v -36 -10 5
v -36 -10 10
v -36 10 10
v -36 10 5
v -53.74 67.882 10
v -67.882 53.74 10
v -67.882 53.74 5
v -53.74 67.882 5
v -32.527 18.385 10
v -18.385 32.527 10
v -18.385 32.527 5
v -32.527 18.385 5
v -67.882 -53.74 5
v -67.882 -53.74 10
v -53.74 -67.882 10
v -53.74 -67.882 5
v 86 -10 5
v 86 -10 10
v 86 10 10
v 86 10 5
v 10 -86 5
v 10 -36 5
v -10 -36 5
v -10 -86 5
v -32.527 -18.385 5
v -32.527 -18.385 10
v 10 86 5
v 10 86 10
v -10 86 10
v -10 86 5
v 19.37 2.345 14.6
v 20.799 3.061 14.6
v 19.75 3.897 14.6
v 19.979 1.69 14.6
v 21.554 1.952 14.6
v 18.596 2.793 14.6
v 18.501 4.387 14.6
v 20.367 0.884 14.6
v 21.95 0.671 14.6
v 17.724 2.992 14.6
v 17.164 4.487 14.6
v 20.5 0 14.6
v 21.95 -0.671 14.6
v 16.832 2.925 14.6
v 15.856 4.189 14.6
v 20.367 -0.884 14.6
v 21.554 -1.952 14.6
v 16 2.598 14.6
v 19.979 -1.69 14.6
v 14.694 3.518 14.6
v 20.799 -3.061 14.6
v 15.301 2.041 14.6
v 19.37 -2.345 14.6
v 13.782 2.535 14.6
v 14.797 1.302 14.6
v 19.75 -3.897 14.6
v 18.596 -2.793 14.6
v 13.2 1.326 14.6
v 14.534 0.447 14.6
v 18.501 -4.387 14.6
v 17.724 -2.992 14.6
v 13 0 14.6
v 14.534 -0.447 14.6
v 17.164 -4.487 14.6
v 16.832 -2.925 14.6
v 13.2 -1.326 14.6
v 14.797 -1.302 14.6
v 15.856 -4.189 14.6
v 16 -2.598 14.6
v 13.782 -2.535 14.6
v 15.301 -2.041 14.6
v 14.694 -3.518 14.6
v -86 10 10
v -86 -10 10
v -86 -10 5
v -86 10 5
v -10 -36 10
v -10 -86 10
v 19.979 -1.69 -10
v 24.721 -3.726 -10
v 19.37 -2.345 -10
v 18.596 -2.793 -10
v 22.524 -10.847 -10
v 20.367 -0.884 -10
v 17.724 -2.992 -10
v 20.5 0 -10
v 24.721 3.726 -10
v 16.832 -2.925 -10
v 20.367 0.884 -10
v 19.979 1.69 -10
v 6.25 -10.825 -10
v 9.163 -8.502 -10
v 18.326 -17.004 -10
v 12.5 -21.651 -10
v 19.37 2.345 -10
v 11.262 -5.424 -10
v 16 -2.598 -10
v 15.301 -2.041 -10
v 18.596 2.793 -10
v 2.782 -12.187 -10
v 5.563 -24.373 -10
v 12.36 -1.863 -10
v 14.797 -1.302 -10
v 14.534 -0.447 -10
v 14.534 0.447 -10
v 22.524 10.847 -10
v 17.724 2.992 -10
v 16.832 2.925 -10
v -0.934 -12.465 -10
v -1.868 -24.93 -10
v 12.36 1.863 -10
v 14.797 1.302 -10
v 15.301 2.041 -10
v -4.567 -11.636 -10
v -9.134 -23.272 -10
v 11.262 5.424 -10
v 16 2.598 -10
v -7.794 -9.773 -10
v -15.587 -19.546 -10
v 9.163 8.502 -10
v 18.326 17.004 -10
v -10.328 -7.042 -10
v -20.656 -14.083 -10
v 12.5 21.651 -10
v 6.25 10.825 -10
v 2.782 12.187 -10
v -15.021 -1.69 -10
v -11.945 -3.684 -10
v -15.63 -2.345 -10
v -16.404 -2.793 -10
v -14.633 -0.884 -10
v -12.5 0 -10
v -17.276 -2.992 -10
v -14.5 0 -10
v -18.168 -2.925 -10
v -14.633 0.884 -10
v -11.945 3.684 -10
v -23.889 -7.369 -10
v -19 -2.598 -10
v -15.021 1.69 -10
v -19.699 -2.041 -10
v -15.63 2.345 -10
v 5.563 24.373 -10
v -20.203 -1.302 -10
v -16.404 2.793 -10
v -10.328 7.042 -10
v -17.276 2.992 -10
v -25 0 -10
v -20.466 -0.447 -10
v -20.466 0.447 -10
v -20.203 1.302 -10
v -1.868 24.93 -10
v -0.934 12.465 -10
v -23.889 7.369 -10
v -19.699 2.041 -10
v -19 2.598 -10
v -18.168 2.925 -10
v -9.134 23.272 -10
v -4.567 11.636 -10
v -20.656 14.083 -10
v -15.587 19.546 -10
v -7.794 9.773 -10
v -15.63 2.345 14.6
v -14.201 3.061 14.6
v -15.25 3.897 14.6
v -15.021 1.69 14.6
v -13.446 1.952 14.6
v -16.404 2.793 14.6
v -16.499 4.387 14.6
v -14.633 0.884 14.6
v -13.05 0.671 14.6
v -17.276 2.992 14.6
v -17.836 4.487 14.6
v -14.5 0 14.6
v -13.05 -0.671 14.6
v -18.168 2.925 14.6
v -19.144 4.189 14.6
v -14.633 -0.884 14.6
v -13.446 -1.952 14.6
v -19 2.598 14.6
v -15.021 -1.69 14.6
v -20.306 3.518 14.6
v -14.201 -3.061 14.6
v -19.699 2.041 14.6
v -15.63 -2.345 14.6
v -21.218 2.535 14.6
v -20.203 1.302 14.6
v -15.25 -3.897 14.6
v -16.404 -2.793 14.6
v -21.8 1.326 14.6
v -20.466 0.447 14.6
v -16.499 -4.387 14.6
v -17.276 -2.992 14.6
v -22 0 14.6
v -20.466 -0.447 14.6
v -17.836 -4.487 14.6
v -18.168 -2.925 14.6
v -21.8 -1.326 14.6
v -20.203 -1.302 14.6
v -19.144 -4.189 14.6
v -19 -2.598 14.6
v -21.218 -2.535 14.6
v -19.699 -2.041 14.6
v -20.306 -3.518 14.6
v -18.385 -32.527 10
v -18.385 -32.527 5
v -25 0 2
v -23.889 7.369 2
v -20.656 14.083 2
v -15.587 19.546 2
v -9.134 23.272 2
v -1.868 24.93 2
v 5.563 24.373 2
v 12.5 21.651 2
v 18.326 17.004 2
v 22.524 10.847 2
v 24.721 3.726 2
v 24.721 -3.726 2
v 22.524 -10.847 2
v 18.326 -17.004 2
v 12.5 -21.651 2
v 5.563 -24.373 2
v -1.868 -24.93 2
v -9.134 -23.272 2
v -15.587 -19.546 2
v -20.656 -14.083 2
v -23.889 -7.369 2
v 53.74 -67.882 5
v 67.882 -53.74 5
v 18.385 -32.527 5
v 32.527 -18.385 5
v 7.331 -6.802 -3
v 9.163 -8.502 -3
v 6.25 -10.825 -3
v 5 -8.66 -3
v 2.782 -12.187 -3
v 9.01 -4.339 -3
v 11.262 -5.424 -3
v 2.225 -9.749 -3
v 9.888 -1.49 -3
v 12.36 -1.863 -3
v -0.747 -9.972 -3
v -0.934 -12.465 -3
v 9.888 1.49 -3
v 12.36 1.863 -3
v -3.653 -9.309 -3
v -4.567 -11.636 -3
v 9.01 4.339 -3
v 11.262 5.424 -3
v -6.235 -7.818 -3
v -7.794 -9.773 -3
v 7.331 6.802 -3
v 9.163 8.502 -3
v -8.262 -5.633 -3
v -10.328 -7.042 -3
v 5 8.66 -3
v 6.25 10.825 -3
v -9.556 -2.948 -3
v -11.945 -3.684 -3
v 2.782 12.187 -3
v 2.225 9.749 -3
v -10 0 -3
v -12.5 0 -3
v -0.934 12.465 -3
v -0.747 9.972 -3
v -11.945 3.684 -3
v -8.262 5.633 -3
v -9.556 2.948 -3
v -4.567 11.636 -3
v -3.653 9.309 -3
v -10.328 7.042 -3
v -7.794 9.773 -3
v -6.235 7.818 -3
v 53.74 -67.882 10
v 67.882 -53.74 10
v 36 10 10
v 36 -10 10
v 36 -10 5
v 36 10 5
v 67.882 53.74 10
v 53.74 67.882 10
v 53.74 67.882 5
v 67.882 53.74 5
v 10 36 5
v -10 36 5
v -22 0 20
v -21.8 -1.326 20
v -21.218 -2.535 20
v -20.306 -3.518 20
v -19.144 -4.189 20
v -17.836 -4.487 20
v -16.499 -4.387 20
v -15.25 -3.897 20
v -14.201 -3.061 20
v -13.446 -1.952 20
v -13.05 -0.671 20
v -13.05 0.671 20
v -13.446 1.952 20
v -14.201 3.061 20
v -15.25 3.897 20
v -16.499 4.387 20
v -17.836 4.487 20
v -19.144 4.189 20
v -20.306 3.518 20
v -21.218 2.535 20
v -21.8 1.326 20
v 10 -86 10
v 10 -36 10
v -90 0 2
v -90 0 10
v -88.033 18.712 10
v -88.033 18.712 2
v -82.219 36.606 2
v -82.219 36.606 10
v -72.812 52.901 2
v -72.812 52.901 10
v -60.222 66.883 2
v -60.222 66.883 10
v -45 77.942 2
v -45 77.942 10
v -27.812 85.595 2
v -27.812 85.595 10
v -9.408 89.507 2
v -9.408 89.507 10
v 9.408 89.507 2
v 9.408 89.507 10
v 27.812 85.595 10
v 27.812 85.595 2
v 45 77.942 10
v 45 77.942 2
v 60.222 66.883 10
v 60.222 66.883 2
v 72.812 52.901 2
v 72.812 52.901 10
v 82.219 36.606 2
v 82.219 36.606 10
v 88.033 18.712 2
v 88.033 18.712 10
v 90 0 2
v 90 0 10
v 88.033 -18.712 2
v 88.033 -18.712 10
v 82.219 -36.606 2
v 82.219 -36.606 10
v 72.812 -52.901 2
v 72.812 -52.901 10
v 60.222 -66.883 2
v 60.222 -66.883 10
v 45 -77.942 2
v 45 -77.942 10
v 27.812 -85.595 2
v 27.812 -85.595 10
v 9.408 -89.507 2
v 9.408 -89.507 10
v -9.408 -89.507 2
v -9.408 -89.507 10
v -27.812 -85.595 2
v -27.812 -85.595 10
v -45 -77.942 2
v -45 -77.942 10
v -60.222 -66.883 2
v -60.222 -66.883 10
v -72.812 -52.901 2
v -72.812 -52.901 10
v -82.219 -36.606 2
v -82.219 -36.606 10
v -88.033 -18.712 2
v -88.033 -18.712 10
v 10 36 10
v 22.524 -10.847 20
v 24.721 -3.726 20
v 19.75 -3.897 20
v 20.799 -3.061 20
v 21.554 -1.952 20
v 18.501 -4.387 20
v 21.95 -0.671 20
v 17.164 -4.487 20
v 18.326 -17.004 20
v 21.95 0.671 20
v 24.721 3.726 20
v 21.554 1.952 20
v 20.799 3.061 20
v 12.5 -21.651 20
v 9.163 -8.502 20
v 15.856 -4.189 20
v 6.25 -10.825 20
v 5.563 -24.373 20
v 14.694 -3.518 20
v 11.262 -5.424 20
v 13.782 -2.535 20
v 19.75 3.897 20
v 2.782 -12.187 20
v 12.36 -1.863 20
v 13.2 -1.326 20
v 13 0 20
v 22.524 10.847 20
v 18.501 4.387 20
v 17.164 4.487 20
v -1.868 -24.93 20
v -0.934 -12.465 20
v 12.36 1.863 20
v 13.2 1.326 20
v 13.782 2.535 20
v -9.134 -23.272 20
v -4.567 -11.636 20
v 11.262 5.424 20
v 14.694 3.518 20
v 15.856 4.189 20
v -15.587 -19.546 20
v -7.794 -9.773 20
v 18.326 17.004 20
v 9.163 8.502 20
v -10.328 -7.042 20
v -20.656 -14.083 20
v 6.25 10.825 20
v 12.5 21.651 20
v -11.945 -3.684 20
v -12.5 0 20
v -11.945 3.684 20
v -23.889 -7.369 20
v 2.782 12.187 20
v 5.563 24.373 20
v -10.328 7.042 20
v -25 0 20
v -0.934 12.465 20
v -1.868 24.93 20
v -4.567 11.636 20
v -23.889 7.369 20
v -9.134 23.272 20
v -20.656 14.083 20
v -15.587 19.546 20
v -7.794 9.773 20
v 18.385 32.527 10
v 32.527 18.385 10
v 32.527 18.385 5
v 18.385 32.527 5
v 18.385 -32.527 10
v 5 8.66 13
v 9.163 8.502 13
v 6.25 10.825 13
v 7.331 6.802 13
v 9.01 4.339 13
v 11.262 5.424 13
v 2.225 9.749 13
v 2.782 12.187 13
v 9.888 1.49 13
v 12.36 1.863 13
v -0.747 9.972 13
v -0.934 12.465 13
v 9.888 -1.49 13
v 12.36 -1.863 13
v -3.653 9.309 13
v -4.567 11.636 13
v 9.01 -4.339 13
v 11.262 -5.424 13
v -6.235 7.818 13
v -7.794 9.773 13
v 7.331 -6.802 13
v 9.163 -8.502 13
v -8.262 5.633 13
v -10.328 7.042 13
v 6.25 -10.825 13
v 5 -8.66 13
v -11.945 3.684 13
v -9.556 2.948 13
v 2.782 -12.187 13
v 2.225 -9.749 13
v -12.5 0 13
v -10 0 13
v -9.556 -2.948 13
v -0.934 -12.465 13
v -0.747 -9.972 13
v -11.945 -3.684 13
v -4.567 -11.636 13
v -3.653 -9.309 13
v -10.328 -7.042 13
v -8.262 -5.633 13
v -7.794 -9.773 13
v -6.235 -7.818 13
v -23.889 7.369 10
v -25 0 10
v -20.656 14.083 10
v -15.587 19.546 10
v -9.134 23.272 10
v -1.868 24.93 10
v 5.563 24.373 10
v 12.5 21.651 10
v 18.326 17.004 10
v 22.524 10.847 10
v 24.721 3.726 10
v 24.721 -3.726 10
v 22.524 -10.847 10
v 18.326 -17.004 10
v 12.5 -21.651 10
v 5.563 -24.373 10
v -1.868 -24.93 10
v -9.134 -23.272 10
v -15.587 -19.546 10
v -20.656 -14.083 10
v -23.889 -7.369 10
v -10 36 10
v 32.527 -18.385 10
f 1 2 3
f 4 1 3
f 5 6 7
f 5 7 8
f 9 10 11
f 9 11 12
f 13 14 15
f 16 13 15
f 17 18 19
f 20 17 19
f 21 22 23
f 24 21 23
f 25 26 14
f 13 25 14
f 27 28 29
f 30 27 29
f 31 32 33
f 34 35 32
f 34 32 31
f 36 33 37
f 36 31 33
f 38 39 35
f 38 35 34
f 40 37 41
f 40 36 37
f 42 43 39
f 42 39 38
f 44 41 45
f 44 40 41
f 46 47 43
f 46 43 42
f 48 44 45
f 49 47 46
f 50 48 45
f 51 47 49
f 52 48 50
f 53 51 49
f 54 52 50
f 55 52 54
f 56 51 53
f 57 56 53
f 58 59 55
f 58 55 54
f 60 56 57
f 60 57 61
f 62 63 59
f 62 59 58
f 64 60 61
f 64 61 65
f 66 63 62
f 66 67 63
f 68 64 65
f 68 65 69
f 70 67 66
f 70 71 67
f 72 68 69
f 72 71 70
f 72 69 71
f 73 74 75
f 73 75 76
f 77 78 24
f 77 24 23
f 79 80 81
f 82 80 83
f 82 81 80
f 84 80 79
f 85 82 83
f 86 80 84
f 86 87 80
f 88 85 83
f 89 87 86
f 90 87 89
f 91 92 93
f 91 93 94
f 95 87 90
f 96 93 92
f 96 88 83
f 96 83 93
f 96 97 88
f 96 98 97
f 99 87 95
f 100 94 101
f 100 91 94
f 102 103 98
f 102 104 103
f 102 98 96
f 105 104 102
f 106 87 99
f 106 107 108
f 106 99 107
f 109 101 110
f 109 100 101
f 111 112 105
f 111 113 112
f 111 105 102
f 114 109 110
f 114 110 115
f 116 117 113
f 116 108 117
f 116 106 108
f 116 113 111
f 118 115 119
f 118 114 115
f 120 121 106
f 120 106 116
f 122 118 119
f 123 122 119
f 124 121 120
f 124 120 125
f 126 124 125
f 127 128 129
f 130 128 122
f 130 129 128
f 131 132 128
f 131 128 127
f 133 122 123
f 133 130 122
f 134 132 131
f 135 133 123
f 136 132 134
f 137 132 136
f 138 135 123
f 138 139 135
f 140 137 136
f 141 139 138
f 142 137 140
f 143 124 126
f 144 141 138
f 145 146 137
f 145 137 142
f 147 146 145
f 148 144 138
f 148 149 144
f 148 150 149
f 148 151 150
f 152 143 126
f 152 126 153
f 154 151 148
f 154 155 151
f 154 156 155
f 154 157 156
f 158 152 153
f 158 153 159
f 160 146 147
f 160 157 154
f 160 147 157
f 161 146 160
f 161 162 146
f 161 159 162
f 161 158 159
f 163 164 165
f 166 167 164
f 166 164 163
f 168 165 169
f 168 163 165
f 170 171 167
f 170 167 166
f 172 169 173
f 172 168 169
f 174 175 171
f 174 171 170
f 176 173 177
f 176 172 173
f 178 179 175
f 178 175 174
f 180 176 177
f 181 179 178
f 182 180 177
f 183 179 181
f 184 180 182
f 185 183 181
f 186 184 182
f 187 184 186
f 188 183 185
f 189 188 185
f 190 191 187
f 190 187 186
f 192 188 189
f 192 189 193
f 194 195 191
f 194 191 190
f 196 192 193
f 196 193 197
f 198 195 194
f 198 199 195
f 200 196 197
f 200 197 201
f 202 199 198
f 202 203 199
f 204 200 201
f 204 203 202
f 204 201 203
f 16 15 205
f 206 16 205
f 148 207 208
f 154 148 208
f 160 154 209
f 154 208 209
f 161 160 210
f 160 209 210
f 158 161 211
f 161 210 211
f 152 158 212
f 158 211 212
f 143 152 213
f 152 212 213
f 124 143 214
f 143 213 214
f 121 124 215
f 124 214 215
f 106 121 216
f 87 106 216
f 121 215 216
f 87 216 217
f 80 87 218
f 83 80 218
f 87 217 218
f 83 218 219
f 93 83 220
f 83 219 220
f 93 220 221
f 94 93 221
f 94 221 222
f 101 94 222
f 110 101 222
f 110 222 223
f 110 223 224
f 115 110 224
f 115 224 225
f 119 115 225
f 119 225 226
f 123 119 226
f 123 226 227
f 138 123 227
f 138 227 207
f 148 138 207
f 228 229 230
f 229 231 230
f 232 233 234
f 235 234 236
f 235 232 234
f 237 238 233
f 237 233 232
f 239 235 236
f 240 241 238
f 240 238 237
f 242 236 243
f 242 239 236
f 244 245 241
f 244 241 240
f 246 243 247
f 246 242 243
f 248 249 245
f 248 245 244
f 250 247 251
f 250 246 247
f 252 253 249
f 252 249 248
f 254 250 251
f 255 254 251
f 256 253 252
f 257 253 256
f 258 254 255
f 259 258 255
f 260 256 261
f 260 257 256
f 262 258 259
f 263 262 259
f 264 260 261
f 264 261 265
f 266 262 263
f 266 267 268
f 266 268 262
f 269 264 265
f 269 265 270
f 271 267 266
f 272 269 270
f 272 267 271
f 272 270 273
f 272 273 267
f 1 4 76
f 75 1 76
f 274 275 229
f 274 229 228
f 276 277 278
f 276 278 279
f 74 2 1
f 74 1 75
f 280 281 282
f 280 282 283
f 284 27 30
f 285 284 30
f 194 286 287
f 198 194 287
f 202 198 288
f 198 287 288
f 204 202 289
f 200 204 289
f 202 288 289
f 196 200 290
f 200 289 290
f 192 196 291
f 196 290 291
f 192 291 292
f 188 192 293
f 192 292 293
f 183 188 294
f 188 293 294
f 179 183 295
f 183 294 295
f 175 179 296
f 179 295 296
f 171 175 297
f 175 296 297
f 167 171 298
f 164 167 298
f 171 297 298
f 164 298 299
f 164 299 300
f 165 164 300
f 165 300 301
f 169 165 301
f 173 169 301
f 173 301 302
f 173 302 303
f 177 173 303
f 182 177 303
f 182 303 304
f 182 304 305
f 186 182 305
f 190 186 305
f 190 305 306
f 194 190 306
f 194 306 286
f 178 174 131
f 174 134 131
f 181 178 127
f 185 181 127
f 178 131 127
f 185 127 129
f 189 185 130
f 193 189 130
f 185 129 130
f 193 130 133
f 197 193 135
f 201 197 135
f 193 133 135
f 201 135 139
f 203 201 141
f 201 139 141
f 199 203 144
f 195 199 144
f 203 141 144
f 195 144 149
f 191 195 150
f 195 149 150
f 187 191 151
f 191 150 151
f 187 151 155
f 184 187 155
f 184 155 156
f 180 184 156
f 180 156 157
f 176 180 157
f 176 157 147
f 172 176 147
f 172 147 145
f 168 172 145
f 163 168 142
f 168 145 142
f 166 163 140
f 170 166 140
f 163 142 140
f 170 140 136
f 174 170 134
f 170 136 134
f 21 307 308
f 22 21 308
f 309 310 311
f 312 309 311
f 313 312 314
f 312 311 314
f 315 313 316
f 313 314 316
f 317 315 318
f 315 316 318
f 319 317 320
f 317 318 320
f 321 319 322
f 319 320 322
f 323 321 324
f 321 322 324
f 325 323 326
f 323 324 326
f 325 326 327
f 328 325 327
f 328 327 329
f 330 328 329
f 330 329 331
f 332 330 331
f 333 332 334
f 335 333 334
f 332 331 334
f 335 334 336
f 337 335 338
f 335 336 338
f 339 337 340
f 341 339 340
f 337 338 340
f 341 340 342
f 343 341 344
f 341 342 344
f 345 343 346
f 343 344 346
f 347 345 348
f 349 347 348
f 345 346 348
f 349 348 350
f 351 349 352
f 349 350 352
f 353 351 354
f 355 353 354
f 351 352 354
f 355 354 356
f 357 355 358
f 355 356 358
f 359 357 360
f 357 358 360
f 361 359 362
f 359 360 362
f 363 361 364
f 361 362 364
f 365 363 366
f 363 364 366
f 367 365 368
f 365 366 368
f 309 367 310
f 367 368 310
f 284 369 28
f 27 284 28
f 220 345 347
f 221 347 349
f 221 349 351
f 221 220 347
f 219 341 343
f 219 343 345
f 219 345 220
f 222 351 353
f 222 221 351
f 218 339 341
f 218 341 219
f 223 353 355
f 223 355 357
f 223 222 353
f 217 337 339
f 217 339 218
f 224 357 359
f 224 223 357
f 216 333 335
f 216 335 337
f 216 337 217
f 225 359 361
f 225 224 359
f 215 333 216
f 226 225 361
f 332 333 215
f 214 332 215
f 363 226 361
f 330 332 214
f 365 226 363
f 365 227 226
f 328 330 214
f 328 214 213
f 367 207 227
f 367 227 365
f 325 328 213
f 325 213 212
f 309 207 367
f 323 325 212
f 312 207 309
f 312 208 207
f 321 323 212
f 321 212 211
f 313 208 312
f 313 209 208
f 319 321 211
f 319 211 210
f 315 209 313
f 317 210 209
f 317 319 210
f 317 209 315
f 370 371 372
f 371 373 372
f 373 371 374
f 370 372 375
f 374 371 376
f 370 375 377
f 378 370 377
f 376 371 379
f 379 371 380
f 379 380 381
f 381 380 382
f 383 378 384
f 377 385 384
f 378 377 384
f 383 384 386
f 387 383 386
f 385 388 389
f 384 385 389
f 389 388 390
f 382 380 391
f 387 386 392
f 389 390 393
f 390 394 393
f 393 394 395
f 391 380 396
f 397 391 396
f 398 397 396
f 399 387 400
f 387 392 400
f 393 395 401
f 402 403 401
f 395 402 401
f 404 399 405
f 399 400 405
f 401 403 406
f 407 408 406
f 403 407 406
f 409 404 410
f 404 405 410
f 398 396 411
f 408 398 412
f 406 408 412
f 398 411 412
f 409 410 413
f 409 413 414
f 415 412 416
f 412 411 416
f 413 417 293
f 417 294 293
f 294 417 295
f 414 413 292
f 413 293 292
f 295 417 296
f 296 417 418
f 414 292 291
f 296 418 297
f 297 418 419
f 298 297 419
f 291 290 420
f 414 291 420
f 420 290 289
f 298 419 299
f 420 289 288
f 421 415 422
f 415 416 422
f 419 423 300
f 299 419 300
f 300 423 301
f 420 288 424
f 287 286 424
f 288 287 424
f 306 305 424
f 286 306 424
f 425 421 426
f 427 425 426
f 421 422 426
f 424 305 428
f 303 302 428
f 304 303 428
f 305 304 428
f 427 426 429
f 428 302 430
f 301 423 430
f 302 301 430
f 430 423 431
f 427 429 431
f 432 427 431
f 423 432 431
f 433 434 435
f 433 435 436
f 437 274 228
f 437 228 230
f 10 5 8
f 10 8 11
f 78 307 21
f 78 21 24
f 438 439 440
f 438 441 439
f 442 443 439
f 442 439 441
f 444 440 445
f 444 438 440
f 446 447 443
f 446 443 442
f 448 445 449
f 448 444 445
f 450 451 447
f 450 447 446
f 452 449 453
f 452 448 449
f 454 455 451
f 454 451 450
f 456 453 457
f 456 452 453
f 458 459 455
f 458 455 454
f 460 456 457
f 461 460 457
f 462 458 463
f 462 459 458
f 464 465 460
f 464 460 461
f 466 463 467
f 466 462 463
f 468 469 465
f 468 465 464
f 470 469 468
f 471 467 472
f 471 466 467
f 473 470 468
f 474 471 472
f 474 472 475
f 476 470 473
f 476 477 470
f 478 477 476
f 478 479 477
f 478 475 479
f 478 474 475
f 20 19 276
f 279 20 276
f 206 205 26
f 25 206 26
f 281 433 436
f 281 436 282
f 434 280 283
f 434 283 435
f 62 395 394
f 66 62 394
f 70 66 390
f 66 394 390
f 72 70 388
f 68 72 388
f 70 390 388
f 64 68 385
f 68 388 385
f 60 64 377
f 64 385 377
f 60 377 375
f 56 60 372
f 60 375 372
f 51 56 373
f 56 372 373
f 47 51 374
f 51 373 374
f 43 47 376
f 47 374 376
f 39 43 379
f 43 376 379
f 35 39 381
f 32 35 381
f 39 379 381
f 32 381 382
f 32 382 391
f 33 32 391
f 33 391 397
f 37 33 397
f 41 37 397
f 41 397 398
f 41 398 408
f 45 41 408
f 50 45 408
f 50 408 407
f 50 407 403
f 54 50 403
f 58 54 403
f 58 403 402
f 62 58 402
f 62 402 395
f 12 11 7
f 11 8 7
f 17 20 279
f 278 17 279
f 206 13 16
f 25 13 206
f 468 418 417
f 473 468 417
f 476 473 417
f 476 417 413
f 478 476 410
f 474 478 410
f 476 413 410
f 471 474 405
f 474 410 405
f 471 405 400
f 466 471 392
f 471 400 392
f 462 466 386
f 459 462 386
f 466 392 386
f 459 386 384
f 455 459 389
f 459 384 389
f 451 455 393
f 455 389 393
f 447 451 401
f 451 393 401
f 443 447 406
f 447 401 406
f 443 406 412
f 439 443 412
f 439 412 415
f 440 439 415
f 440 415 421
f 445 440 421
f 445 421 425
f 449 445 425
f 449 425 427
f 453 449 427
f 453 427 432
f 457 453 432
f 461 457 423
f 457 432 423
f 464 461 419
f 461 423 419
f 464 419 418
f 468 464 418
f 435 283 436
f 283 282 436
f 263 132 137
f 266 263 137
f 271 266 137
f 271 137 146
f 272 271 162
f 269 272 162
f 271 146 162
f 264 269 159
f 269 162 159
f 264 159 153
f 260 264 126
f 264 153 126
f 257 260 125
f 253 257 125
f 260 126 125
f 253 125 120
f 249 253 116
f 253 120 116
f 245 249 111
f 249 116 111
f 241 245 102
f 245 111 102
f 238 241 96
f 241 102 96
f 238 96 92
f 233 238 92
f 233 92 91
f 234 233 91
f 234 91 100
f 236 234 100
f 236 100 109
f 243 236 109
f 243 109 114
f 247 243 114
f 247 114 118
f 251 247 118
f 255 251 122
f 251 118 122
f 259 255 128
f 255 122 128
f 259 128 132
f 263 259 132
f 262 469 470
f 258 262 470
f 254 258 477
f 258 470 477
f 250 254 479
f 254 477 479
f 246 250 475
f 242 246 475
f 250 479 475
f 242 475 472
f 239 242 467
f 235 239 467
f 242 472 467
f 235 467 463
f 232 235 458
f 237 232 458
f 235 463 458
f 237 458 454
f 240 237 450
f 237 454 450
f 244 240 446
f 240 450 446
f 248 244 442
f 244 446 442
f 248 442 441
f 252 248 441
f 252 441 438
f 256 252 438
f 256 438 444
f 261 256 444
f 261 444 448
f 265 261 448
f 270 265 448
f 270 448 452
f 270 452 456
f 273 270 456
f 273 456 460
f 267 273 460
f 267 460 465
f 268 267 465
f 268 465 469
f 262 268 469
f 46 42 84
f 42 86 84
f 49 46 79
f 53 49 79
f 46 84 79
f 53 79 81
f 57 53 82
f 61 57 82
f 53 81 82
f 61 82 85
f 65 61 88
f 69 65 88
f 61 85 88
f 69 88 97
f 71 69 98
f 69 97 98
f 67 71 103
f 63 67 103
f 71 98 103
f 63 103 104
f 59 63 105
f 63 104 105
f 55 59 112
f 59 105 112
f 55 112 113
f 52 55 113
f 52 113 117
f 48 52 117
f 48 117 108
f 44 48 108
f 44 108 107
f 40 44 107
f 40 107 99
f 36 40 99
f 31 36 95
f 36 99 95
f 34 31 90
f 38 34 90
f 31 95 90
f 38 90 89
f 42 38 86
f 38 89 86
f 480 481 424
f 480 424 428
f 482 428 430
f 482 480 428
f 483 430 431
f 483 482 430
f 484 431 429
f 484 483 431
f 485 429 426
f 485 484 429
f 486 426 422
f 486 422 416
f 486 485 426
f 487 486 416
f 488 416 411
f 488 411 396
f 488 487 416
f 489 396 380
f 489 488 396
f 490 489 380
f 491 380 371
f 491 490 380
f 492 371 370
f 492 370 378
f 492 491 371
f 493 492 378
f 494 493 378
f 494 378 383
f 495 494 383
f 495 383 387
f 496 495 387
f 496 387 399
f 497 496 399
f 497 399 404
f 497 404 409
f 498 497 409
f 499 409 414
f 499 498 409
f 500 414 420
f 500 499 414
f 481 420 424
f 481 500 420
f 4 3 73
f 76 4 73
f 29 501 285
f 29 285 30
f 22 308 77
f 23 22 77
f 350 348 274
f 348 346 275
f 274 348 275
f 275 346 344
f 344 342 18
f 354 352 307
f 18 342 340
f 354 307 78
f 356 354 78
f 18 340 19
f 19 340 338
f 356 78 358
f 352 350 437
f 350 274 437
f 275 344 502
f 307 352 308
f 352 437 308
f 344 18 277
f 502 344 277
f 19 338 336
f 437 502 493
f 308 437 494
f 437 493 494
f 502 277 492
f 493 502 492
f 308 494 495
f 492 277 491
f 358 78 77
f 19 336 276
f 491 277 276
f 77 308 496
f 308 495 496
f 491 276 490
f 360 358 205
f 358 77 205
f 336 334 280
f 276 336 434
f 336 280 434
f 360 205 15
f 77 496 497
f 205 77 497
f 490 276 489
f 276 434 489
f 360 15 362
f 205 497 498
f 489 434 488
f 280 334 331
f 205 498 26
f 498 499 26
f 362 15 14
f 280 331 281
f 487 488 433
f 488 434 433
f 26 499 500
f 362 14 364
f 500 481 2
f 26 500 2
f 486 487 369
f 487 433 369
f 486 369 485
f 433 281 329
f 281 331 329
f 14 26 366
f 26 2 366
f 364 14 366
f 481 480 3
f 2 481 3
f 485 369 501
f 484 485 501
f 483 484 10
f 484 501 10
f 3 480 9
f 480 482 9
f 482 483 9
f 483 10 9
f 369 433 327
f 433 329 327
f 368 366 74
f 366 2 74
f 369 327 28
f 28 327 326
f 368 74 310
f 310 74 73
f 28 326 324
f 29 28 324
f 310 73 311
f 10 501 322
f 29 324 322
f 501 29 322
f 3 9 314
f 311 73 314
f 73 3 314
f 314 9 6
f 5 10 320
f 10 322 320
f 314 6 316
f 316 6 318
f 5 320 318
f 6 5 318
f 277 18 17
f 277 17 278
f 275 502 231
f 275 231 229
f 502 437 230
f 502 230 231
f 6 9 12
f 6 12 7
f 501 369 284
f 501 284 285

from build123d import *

# Parameters (mm, degrees)
SKETCH_R             = 90
PAD_DEPTH            = 8
SKETCH001_W          = 20
SKETCH001_H          = 50
POCKET_DEPTH         = 5
SKETCH002_W          = 20
SKETCH002_H          = 50
POCKET001_DEPTH      = 5
SKETCH003_W          = 50
SKETCH003_H          = 20
POCKET002_DEPTH      = 5
SKETCH004_W          = 50
SKETCH004_H          = 20
POCKET003_DEPTH      = 5
POCKET004_DEPTH      = 5
POCKET005_DEPTH      = 5
POCKET006_DEPTH      = 5
POCKET007_DEPTH      = 5
SKETCH009_R          = 25
PAD001_DEPTH         = 20
PAD001_DEPTH_BACK    = 10
SKETCH010_R          = 10
HOLE_DEPTH           = 30.001
SKETCH011_R          = 12.5
POCKET008_DEPTH      = 7
SKETCH012_R          = 12.5
POCKET009_DEPTH      = 7
HOLE001_D            = 6
HOLE001_CBORE_D      = 9
HOLE001_CBORE_DEPTH  = 5.4
BODY_PLACEMENT_ANGLE = 180


with BuildPart() as part:
    # Sketch → Pad (new body)
    with BuildSketch(Plane.XY):
        Circle(SKETCH_R)
    extrude(amount=PAD_DEPTH)

    # Sketch001 → Pocket (cut)
    with BuildSketch(Plane.XY):
        with Locations((0, 61)):
            Rectangle(SKETCH001_W, SKETCH001_H)
    extrude(amount=POCKET_DEPTH, mode=Mode.SUBTRACT)

    # Sketch002 → Pocket001 (cut)
    with BuildSketch(Plane.XY):
        with Locations((0, -61)):
            Rectangle(SKETCH002_W, SKETCH002_H)
    extrude(amount=POCKET001_DEPTH, mode=Mode.SUBTRACT)

    # Sketch003 → Pocket002 (cut)
    with BuildSketch(Plane.XY):
        with Locations((61, 0)):
            Rectangle(SKETCH003_W, SKETCH003_H)
    extrude(amount=POCKET002_DEPTH, mode=Mode.SUBTRACT)

    # Sketch004 → Pocket003 (cut)
    with BuildSketch(Plane.XY):
        with Locations((-61, 0)):
            Rectangle(SKETCH004_W, SKETCH004_H)
    extrude(amount=POCKET003_DEPTH, mode=Mode.SUBTRACT)

    # Sketch005 → Pocket004 (cut)
    with BuildSketch(Plane.XY):
        Polygon((-67.882251, 53.740115), (-32.526912, 18.384776), (-18.384776, 32.526912), (-53.740115, 67.882251), align=None)
    extrude(amount=POCKET004_DEPTH, mode=Mode.SUBTRACT)

    # Sketch006 → Pocket005 (cut)
    with BuildSketch(Plane.XY):
        Polygon((18.384776, 32.526912), (32.526912, 18.384776), (67.882251, 53.740115), (53.740115, 67.882251), align=None)
    extrude(amount=POCKET005_DEPTH, mode=Mode.SUBTRACT)

    # Sketch007 → Pocket006 (cut)
    with BuildSketch(Plane.XY):
        Polygon((-67.882251, -53.740115), (-53.740115, -67.882251), (-18.384776, -32.526912), (-32.526912, -18.384776), align=None)
    extrude(amount=POCKET006_DEPTH, mode=Mode.SUBTRACT)

    # Sketch008 → Pocket007 (cut)
    with BuildSketch(Plane.XY):
        Polygon((18.384776, -32.526912), (32.526912, -18.384776), (67.882251, -53.740115), (53.740115, -67.882251), align=None)
    extrude(amount=POCKET007_DEPTH, mode=Mode.SUBTRACT)

    # Sketch009 → Pad001 (join, two sides)
    with BuildSketch(Plane.XY) as pad001_sk:
        Circle(SKETCH009_R)
    extrude(amount=PAD001_DEPTH)
    extrude(pad001_sk.sketch, amount=-PAD001_DEPTH_BACK)

    # Sketch010 (on Face42 of Pad001) → Hole (cut, through all)
    with BuildSketch(Plane(origin=(0, 0, -10), x_dir=(1, 0, 0), z_dir=(0, 0, -1))):
        Circle(SKETCH010_R)
    extrude(amount=-HOLE_DEPTH, mode=Mode.SUBTRACT)

    # Sketch011 (on Face42 of Hole) → Pocket008 (cut)
    with BuildSketch(Plane(origin=(0, 0, -10), x_dir=(1, 0, 0), z_dir=(0, 0, -1))):
        Circle(SKETCH011_R)
    extrude(amount=-POCKET008_DEPTH, mode=Mode.SUBTRACT)

    # Sketch012 (on Face47 of Pocket008) → Pocket009 (cut)
    with BuildSketch(Plane.XY.offset(20)):
        Circle(SKETCH012_R)
    extrude(amount=-POCKET009_DEPTH, mode=Mode.SUBTRACT)

    # Hole001 (through all)
    with Locations(Plane(origin=(0, 0, -10), x_dir=(1, 0, 0), z_dir=(0, 0, -1))):
        with Locations((0, 0), (17.5, 0), (-17.5, 0)):
            CounterBoreHole(HOLE001_D / 2, HOLE001_CBORE_D / 2, HOLE001_CBORE_DEPTH)


with BuildPart() as part_1:
    # Body placement: moved
    add(part.part.moved(Location((0, 0, 10))).rotate(Axis((0, 0, 10), (0, 1, 0)), BODY_PLACEMENT_ANGLE))


solid = part_1.part
